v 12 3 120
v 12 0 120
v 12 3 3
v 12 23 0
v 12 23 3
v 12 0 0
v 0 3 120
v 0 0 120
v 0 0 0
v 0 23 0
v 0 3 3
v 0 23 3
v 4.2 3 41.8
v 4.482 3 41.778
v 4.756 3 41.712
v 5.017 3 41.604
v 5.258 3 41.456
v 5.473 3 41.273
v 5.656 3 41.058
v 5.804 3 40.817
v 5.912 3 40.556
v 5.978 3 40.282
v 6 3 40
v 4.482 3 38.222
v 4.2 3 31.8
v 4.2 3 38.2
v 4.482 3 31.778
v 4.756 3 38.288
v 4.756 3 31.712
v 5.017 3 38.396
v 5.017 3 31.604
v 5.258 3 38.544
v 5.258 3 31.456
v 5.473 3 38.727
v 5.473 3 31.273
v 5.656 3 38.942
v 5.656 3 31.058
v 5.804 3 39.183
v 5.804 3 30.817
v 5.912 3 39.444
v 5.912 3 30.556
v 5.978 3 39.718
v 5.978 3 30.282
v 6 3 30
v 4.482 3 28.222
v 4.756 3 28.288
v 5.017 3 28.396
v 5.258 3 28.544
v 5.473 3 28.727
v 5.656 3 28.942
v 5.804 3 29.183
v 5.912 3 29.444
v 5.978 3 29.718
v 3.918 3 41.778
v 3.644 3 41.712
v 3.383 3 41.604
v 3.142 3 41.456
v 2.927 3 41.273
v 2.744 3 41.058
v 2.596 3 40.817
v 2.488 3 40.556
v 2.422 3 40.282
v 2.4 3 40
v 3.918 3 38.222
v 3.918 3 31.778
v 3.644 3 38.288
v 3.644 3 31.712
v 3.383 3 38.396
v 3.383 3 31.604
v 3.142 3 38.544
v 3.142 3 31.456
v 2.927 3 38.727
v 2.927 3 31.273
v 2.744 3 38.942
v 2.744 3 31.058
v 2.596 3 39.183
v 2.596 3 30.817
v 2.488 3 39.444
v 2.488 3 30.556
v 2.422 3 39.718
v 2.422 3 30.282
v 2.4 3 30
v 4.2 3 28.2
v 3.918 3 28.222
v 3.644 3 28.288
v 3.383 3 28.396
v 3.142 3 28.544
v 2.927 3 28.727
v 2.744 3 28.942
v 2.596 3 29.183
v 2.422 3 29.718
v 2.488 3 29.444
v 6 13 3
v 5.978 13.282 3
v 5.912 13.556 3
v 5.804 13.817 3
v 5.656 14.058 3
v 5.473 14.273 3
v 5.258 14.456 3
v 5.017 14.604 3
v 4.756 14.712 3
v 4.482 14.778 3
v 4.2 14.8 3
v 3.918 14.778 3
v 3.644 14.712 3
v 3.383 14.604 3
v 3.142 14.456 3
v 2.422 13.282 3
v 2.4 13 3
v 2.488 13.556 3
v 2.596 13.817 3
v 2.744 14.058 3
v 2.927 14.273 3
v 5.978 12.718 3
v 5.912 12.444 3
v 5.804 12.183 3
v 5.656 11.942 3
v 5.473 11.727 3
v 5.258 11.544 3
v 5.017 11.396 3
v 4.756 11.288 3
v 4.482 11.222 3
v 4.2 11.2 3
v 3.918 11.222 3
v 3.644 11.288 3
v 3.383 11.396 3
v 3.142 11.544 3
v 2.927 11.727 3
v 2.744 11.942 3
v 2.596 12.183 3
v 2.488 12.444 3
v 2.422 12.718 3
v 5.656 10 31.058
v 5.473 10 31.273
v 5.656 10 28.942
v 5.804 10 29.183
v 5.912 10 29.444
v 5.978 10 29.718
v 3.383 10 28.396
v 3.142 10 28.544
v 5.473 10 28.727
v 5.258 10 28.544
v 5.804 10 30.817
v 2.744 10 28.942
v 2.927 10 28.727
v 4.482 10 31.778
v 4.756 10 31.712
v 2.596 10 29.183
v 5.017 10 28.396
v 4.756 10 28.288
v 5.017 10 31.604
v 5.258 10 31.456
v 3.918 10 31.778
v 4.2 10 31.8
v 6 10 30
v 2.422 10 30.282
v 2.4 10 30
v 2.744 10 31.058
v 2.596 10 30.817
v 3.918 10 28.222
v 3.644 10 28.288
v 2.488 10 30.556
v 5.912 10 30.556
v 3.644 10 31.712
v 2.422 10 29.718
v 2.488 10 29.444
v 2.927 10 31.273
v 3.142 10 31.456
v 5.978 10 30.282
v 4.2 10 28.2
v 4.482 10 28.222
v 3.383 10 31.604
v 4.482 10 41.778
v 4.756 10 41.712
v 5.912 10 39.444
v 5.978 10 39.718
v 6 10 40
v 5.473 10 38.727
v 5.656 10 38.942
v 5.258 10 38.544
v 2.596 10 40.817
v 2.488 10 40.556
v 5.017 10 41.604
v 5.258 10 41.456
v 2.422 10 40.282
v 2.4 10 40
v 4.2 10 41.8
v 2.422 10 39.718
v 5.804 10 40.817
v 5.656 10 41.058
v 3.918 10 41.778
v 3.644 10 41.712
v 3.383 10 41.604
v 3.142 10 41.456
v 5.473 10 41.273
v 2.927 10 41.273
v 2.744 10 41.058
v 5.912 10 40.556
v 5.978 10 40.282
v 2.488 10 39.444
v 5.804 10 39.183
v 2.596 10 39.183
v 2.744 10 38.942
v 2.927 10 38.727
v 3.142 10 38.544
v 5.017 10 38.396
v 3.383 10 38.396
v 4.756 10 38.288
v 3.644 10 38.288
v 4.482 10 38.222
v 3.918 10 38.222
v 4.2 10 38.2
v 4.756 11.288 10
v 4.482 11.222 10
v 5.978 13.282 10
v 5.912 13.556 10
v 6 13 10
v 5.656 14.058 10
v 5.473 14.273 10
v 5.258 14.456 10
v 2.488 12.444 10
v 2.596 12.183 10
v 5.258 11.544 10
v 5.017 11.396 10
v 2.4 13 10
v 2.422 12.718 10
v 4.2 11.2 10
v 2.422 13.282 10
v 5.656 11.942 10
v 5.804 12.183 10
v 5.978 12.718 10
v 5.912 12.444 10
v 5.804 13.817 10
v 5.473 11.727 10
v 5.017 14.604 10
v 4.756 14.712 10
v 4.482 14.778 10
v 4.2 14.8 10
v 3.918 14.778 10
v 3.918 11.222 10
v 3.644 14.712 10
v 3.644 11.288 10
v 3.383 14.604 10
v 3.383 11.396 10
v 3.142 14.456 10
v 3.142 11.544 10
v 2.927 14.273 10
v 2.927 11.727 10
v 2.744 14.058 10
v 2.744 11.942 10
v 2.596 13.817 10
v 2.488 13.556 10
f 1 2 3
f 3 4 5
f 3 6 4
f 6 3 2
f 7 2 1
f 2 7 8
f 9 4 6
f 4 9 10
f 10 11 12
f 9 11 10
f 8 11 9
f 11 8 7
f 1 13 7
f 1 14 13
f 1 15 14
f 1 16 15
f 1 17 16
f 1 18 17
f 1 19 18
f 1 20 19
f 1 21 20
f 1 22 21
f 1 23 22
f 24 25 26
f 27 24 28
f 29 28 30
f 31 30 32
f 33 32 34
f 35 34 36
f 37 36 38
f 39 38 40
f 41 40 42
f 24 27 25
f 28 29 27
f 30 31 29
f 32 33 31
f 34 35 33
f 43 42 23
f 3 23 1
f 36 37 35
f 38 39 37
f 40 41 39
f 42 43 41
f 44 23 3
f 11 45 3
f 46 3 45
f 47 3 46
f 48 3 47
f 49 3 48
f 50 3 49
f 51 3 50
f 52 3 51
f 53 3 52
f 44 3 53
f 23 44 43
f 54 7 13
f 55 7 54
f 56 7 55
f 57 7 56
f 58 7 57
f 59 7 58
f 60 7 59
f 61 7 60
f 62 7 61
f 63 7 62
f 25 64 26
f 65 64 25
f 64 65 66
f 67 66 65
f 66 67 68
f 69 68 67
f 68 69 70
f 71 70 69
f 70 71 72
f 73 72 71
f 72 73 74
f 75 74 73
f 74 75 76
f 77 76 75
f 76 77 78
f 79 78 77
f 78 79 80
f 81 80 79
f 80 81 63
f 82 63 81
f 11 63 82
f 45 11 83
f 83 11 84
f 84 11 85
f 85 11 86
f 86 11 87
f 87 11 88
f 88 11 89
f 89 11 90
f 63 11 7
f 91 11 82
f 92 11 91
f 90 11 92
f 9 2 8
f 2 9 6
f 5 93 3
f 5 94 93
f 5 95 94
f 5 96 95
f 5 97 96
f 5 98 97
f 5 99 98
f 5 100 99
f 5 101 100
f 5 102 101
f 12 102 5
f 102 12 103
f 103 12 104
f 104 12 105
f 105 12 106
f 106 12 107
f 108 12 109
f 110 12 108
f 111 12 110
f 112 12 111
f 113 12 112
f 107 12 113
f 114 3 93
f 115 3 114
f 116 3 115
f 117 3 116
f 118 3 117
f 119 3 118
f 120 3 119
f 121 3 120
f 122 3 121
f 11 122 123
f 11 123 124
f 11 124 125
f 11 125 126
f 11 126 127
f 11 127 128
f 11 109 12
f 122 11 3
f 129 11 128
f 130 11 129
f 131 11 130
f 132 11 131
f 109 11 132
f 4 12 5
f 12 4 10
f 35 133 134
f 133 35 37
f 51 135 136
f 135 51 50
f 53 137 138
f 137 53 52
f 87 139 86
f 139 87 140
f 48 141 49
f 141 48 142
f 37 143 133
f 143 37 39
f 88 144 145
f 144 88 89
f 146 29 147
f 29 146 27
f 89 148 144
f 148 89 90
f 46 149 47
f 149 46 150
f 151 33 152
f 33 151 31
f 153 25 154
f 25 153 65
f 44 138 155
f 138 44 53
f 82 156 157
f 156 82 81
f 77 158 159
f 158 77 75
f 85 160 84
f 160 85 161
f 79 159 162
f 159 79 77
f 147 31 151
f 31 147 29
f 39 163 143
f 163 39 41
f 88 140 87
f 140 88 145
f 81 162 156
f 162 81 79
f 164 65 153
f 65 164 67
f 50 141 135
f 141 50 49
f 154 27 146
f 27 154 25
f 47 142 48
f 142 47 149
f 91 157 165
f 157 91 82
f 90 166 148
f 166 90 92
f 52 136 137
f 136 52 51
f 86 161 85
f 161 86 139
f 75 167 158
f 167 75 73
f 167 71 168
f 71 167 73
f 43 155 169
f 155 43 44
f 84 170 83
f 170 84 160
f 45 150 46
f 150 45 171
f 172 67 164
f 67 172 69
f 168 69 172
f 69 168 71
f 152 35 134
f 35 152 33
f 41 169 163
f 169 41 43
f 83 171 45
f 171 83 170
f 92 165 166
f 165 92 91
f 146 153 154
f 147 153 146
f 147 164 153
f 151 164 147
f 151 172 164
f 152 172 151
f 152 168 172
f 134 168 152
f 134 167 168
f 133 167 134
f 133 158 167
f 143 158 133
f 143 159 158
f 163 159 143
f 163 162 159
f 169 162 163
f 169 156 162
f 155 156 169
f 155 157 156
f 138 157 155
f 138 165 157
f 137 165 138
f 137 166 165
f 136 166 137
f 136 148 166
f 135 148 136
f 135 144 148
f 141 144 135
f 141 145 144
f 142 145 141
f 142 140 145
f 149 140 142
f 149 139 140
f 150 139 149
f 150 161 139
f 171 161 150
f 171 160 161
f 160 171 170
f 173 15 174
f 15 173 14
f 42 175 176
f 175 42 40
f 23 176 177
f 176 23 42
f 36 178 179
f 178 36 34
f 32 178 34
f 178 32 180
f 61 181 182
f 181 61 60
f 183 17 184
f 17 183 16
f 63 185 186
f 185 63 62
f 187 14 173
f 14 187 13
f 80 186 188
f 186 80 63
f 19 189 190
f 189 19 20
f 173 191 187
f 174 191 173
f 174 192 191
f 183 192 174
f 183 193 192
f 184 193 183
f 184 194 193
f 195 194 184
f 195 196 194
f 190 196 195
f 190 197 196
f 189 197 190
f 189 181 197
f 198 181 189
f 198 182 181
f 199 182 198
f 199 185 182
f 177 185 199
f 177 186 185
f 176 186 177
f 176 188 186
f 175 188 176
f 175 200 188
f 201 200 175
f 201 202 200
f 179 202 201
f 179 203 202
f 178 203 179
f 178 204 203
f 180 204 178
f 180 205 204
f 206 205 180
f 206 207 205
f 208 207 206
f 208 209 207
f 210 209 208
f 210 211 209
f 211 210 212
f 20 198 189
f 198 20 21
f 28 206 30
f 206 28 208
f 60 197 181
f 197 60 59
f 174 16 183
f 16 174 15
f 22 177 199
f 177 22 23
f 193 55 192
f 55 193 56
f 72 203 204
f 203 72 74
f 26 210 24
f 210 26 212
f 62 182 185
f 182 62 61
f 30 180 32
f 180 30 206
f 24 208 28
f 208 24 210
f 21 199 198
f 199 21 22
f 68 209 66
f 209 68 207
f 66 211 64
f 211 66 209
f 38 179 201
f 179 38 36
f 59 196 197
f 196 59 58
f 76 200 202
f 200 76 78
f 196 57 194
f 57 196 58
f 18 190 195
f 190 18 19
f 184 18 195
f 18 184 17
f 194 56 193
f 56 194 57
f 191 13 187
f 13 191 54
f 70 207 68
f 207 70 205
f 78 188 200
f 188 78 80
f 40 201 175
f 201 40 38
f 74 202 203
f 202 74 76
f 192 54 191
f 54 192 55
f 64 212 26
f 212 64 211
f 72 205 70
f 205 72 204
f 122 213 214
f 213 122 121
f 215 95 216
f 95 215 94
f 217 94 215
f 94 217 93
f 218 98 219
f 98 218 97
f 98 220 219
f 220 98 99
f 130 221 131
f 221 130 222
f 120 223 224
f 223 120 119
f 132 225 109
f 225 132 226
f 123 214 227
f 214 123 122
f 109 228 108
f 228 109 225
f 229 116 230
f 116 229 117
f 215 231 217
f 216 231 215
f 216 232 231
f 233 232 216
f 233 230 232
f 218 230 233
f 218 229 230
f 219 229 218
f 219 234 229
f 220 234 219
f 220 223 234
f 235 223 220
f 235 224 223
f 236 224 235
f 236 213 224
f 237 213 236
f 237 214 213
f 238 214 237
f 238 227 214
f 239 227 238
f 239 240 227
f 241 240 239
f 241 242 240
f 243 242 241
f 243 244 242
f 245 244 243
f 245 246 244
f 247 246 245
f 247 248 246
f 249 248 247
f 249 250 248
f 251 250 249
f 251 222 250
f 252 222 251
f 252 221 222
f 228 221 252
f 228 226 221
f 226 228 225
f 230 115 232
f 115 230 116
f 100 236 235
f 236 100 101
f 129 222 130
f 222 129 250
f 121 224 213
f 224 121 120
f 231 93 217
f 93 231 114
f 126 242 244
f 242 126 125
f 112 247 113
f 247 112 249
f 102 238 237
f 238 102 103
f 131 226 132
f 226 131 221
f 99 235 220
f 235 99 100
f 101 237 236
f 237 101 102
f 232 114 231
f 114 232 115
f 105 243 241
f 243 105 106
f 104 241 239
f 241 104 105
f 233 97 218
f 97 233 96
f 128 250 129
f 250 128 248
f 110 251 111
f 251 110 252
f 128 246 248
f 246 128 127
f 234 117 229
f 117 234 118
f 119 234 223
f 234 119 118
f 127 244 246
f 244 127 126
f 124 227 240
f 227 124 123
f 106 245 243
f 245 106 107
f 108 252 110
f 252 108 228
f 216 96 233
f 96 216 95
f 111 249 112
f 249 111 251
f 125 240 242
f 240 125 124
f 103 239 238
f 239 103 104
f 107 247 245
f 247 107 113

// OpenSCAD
$fn = 40;

union() {
	union() {
		cube([12, 3, 120]);
		cube([12, 20+3, 3]);
	}
	for(z=[30, 40]) {
		translate([6-1.8, 0, z]) {
			rotate([-90, 0, 0]) {
				cylinder(d=3.6, h=10);
			}
		}
	}
	translate([6-1.8, 10+3, 0]) {
		cylinder(d=3.6, h=10);
	}
}
